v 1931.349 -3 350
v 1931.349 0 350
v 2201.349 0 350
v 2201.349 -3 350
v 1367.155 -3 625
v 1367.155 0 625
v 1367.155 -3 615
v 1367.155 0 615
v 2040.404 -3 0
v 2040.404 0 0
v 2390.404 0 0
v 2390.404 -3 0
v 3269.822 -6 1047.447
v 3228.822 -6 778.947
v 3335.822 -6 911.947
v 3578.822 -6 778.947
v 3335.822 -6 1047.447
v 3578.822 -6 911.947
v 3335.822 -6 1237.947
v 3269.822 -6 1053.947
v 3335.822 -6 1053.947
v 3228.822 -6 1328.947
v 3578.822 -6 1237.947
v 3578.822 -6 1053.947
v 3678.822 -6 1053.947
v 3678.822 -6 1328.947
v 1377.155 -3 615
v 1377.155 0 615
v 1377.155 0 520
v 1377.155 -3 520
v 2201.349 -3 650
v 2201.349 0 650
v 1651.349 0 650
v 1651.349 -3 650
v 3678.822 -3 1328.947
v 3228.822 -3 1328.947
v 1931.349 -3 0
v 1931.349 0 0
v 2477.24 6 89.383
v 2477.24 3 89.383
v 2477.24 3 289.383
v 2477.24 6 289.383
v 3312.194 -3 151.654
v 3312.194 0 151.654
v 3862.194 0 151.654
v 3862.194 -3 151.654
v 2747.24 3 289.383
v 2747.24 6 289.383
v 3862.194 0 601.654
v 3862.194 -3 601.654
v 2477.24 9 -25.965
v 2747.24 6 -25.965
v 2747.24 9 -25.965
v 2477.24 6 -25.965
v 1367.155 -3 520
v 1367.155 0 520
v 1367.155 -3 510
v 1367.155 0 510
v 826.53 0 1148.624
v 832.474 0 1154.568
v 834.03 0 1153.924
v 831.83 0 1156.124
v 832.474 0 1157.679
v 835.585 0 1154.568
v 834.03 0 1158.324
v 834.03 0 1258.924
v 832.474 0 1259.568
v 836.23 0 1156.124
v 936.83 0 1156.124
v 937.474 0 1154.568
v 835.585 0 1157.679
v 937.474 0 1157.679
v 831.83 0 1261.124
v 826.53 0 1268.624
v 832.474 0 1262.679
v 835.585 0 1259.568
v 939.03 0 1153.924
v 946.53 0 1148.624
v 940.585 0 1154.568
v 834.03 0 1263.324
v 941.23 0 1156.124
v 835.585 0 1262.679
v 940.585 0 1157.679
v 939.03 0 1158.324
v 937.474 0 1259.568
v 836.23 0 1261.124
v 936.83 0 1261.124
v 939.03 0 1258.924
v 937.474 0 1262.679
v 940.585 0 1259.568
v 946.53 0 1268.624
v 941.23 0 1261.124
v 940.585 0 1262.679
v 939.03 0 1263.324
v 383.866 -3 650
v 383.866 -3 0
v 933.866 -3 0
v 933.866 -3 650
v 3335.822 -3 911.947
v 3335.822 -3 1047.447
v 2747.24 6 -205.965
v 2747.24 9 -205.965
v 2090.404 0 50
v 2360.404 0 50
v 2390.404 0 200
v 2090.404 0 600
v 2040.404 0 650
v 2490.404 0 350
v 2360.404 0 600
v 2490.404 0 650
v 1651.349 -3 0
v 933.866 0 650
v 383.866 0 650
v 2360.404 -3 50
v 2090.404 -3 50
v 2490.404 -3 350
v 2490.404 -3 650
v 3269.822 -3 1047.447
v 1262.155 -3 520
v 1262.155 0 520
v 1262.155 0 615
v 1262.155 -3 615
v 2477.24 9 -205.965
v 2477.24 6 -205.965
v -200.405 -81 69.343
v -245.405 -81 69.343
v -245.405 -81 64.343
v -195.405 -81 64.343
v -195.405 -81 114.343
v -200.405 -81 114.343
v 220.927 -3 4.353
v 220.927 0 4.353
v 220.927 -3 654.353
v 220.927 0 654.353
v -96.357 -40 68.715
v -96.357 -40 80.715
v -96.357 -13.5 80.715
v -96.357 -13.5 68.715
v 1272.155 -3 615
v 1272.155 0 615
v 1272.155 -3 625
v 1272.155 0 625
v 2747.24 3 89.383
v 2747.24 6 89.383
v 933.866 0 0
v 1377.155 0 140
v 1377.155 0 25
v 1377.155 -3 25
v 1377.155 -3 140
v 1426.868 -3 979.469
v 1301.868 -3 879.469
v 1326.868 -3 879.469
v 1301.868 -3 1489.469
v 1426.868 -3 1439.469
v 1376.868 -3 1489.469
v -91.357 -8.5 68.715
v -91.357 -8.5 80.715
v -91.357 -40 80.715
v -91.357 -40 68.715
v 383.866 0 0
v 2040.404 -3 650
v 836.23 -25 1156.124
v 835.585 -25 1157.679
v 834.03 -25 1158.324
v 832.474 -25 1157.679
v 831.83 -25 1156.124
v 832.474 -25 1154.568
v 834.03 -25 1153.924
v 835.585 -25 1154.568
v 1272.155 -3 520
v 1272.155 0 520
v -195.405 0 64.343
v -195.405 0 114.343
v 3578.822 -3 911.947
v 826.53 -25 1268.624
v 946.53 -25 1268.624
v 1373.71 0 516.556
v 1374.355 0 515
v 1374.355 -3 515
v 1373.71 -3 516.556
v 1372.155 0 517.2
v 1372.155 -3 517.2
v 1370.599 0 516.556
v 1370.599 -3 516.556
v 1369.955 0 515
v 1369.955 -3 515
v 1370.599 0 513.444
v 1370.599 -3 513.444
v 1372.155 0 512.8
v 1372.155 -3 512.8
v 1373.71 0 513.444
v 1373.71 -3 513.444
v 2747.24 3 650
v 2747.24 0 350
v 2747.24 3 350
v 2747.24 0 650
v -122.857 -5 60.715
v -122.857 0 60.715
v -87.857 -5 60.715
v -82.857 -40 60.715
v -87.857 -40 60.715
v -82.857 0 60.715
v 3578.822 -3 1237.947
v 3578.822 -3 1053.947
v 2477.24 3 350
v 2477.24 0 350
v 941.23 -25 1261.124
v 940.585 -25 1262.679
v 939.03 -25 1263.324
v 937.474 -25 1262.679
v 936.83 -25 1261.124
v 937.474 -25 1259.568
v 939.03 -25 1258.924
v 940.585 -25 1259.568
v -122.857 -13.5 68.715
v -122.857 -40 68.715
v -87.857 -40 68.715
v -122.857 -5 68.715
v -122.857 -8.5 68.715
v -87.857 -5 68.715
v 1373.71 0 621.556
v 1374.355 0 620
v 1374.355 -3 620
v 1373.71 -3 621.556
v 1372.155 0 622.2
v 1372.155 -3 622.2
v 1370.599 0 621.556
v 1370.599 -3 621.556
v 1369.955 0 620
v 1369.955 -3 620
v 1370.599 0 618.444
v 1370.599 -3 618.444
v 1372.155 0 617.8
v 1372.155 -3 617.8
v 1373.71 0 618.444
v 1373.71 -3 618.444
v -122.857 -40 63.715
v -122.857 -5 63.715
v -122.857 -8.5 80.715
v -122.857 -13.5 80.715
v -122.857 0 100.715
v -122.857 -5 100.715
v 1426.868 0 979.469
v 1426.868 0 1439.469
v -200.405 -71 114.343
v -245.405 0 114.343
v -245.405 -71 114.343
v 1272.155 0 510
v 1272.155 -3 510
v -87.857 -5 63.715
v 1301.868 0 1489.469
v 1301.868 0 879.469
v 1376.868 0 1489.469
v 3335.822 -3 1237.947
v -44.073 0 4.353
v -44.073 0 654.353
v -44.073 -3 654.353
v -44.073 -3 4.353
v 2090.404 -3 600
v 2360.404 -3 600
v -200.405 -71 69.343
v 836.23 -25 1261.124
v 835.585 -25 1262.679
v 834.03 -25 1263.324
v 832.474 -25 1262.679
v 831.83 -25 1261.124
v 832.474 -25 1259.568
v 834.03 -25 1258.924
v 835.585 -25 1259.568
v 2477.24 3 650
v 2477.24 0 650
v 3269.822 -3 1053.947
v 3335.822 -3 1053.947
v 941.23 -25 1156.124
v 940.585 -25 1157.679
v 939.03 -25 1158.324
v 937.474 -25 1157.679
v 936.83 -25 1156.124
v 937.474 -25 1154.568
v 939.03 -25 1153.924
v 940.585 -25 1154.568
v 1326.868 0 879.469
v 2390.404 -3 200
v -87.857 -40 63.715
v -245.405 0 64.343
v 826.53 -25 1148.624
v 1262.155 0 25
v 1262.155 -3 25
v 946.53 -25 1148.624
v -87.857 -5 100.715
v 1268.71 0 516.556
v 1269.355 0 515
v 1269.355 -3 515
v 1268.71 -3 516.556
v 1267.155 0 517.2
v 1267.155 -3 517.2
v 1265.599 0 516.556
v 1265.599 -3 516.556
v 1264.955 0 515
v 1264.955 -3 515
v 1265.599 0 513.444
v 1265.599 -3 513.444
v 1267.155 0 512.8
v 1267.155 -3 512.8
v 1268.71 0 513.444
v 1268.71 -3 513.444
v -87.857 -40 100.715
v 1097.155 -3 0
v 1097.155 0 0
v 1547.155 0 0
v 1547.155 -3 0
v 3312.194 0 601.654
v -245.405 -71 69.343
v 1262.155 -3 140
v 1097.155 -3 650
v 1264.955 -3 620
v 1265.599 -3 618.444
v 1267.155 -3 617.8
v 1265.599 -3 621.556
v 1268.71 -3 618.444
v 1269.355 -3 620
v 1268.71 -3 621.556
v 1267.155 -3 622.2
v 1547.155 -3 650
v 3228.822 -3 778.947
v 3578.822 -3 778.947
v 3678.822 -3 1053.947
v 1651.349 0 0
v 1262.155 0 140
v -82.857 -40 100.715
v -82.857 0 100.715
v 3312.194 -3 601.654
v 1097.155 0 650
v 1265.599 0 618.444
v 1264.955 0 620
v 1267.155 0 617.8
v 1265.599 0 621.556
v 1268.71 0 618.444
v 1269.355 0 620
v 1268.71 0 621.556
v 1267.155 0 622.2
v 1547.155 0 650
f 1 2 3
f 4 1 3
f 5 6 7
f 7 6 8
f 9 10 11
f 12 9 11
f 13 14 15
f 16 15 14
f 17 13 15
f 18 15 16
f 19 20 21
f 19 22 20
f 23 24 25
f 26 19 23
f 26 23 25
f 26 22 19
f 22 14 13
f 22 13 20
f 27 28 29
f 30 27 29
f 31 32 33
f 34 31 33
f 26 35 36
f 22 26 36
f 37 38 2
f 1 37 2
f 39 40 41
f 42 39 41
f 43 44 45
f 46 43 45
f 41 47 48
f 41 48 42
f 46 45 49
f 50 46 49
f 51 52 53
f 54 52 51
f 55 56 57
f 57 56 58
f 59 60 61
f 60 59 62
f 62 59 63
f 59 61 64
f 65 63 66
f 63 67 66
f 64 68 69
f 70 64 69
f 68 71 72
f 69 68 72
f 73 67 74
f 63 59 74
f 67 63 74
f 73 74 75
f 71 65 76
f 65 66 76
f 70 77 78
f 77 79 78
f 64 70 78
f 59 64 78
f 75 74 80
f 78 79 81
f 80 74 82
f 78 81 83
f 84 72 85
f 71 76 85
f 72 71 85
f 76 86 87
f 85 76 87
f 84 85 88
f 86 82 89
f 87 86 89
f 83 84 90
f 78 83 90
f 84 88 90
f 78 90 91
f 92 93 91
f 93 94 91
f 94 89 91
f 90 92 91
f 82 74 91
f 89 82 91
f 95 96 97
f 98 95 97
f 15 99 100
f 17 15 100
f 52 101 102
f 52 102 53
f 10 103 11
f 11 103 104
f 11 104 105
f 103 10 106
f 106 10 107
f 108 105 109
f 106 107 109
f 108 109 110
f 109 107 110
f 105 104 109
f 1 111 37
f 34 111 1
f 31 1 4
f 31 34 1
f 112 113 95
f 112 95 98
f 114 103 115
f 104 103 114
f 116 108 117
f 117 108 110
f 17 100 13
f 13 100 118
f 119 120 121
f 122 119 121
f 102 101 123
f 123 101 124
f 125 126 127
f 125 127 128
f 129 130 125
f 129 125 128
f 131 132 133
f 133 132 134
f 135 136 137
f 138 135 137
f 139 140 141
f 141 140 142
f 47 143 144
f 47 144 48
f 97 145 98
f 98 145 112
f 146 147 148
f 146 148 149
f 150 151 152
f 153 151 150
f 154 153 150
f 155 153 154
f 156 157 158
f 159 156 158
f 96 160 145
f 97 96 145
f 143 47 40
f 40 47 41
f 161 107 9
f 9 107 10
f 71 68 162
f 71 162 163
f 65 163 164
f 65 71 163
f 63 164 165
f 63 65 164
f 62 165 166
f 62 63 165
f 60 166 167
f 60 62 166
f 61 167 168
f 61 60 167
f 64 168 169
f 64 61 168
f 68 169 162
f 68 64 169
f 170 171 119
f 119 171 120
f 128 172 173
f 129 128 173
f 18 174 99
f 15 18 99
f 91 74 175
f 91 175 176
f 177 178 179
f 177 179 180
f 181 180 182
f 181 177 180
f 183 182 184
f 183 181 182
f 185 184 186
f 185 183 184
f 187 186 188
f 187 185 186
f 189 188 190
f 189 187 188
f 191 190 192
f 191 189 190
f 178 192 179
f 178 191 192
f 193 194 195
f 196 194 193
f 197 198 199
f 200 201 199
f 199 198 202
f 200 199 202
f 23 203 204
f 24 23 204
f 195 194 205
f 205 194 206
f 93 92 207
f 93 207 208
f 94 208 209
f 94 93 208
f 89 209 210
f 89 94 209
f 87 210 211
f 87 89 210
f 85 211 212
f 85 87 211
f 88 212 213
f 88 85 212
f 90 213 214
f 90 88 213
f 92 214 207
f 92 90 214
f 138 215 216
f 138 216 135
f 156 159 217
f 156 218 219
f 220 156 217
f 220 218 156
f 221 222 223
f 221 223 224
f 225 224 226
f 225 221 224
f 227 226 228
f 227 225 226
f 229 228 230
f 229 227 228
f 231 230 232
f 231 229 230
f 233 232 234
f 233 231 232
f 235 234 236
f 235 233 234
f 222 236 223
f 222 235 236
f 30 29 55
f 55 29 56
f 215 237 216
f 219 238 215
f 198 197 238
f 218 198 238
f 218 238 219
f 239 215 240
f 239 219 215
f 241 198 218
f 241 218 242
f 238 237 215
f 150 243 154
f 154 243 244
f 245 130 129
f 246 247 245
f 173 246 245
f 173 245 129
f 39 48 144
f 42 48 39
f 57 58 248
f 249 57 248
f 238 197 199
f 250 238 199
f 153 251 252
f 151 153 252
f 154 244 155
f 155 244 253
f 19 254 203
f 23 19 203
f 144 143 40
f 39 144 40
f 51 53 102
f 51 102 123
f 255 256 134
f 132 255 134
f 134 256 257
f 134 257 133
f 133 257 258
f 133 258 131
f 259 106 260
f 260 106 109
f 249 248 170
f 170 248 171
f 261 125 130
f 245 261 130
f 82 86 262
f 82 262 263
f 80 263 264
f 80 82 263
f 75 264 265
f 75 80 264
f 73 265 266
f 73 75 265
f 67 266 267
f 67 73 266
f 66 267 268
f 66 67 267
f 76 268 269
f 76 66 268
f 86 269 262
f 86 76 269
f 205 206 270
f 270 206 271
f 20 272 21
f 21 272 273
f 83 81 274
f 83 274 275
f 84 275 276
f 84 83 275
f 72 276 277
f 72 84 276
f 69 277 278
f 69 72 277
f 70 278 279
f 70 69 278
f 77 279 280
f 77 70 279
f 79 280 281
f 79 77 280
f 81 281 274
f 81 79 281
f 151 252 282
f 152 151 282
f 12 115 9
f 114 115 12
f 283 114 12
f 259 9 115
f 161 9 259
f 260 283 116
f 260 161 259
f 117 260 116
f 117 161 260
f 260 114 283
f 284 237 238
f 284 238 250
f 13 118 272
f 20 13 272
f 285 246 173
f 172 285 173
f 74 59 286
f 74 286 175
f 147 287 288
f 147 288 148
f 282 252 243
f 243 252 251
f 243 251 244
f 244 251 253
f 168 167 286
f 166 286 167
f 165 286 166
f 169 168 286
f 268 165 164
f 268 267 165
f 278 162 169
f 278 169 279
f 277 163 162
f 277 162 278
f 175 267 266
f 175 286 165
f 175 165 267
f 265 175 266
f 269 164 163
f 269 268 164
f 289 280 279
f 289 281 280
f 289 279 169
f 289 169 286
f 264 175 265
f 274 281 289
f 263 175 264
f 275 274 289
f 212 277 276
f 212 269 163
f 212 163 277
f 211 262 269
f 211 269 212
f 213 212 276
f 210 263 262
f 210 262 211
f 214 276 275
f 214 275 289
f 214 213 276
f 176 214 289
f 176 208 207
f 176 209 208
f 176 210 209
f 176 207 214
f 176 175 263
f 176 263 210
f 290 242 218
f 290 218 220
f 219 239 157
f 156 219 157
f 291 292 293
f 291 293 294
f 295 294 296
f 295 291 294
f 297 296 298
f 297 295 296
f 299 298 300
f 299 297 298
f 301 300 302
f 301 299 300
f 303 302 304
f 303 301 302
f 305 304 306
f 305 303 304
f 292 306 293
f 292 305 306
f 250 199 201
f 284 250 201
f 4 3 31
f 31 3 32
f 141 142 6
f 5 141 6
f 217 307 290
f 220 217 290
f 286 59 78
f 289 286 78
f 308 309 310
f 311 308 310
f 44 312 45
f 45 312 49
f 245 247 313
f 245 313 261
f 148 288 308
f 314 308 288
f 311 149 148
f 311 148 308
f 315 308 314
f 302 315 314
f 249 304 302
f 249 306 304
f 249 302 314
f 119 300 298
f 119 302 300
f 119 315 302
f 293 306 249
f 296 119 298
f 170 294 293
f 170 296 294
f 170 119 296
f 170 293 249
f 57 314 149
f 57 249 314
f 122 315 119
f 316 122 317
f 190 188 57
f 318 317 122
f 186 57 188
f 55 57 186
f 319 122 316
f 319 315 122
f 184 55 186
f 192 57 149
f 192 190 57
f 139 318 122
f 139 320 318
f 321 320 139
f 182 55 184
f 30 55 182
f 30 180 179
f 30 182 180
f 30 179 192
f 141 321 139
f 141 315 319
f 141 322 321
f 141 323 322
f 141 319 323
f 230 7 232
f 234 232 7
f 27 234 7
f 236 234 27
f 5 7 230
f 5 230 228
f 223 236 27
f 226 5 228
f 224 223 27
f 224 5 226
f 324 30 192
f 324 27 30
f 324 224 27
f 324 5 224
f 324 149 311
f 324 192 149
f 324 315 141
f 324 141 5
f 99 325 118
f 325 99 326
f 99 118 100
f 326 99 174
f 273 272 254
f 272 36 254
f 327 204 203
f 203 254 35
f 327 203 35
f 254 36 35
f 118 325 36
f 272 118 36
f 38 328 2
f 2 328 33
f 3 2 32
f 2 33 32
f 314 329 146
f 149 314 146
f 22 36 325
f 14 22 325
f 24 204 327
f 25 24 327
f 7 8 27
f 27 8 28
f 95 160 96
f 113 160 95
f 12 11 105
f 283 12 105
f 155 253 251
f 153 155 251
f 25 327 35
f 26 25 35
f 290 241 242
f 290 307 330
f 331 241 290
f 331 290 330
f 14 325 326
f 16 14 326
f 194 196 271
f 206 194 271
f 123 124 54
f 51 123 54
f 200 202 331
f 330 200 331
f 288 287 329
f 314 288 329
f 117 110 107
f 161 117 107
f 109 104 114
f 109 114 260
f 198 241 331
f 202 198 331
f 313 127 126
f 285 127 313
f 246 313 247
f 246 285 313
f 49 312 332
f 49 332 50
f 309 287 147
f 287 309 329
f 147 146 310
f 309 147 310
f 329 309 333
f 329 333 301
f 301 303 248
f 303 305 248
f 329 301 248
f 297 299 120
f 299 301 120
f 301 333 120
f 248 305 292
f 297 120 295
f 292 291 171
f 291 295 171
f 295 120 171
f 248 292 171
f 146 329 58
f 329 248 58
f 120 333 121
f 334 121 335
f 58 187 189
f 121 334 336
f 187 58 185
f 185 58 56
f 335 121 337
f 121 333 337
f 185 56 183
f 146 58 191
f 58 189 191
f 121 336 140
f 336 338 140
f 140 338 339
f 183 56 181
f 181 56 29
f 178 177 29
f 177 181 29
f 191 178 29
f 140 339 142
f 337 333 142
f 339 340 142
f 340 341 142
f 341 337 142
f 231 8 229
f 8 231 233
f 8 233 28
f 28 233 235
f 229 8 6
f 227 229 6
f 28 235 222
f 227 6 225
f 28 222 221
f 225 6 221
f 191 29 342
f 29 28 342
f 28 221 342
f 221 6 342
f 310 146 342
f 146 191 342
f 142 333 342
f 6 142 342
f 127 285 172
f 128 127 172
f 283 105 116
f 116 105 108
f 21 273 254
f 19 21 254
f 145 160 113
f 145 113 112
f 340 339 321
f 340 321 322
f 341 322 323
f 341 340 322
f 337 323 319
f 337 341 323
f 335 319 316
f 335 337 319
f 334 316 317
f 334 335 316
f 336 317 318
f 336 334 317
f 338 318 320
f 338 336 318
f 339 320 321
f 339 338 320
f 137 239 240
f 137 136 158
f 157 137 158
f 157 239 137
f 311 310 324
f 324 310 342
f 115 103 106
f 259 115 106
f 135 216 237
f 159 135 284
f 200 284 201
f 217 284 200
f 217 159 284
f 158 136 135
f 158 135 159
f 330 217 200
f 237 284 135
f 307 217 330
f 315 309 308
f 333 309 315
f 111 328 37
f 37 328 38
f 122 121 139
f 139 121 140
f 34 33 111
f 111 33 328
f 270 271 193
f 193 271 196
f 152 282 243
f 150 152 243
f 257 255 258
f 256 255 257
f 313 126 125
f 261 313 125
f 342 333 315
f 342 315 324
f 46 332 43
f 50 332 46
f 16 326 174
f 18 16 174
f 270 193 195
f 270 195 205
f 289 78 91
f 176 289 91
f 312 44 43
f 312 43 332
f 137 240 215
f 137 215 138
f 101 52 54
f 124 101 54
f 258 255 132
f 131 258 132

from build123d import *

# Parameters (mm, degrees)
F0_W      = 40
F0_H      = 40
F1_DEPTH  = 40
F2_W      = 35
F2_H      = 35
F3_DEPTH  = 20
F4_W      = 35
F4_H      = 35
F5_DEPTH  = 3
F6_W      = 26.5
F6_H      = 26.5
F7_DEPTH  = 12
F8_W      = 265
F8_H      = 650
F9_DEPTH  = 3
F10_W     = 550
F10_H     = 650
F11_DEPTH = 3
F12_W     = 450
F12_H     = 650
F12_W_2   = 115
F12_H_2   = 115
F12_R     = 2.2
F13_DEPTH = 3
F15_DEPTH = 3
F16_W     = 270
F16_H     = 550
F17_DEPTH = 3
F18_W     = 13.1645835346
F18_H     = 300
F18_W_2   = 256.8354164654
F19_DEPTH = 3
F20_W     = 270
F20_H     = 200
F21_DEPTH = 3
F22_W     = 270
F22_H     = 180
F23_DEPTH = 3
F24_W     = 550
F24_H     = 450
F25_DEPTH = 3
F27_DEPTH = 3
F28_W     = 50
F28_H     = 50
F29_DEPTH = 81
F30_W     = 45
F30_H     = 45
F31_DEPTH = 10
F32_W     = 120
F32_H     = 120
F32_R     = 2.2
F33_DEPTH = 25
F35_DEPTH = 3


with BuildPart() as f1:
    # F0 (on Front) → F1 (new body)
    with BuildSketch(Plane.XZ):
        with Locations((-102.8566464484, 80.7153475598)):
            Rectangle(F0_W, F0_H)
    extrude(amount=F1_DEPTH)

    # F2 (on face) → F3 (cut)
    with BuildSketch(Plane.XY.offset(100.7153475598)):
        with Locations((-105.3566464484, -22.5)):
            Rectangle(F2_W, F2_H)
    extrude(amount=-F3_DEPTH, mode=Mode.SUBTRACT)

    # F4 (on face) → F5 (cut)
    with BuildSketch(Plane(origin=(0, 0, 60.7153475598), x_dir=(1, 0, 0), z_dir=(0, 0, -1))):
        with Locations((-105.3566464484, 22.5)):
            Rectangle(F4_W, F4_H)
    extrude(amount=-F5_DEPTH, mode=Mode.SUBTRACT)

    # F6 (on face) → F7 (cut)
    with BuildSketch(Plane.XY.offset(80.7153475598)):
        with Locations((-109.6066464484, -26.75)):
            Rectangle(F6_W, F6_H)
        Polygon((-91.3566464484, -8.5), (-91.3566464484, -40), (-87.8566464484, -40), (-87.8566464484, -5), (-91.3566464484, -5), (-91.9287055731, -5), (-122.8566464484, -5), (-122.8566464484, -8.5), align=None)
    extrude(amount=-F7_DEPTH, mode=Mode.SUBTRACT)


with BuildPart() as f9:
    # F8 (on Front) → F9 (new body)
    with BuildSketch(Plane.XZ):
        with Locations((88.4266790748, 329.3526981026)):
            Rectangle(F8_W, F8_H)
    extrude(amount=F9_DEPTH)


with BuildPart() as f11:
    # F10 (on Front) → F11 (new body)
    with BuildSketch(Plane.XZ):
        with Locations((658.8658335028, 325)):
            Rectangle(F10_W, F10_H)
    extrude(amount=F11_DEPTH)


with BuildPart() as f13:
    # F12 (on Front) → F13 (new body)
    with BuildSketch(Plane.XZ):
        with Locations((1322.1548128128, 325)):
            Rectangle(F12_W, F12_H)
        with Locations((1319.6548128128, 82.5)):
            Rectangle(F12_W_2, F12_H_2, mode=Mode.SUBTRACT)
        with Locations((1267.1548128128, 515)):
            Circle(F12_R, mode=Mode.SUBTRACT)
        Polygon((1262.1548128128, 520), (1262.1548128128, 615), (1272.1548128128, 615), (1272.1548128128, 625), (1367.1548128128, 625), (1367.1548128128, 615), (1377.1548128128, 615), (1377.1548128128, 520), (1367.1548128128, 520), (1367.1548128128, 510), (1272.1548128128, 510), (1272.1548128128, 520), align=None, mode=Mode.SUBTRACT)
        with Locations((1267.1548128128, 620)):
            Circle(F12_R, mode=Mode.SUBTRACT)
        with Locations((1372.1548128128, 515)):
            Circle(F12_R, mode=Mode.SUBTRACT)
        with Locations((1372.1548128128, 620)):
            Circle(F12_R, mode=Mode.SUBTRACT)
    extrude(amount=F13_DEPTH)


with BuildPart() as f15:
    # F14 (on Front) → F15 (new body)
    with BuildSketch(Plane.XZ):
        Polygon((1651.3492820922, 650), (1651.3492820922, 0), (1931.3492820922, 0), (1931.3492820922, 350), (2201.3492820922, 350), (2201.3492820922, 650), align=None)
    extrude(amount=F15_DEPTH)


with BuildPart() as f17:
    # F16 (on Front) → F17 (new body)
    with BuildSketch(Plane.XZ):
        Polygon((2040.4041732257, 650), (2040.4041732257, 0), (2390.4041732257, 0), (2390.4041732257, 200), (2490.4041732257, 350), (2490.4041732257, 650), (2390.4041732257, 650), align=None)
        with Locations((2225.4041732257, 325)):
            Rectangle(F16_W, F16_H, mode=Mode.SUBTRACT)
    extrude(amount=F17_DEPTH)


with BuildPart() as f19:
    # F18 (on face) → F19 (new body)
    with BuildSketch(Plane(origin=(0, 0, 0), x_dir=(-1, 0, 0), z_dir=(0, 1, 0))):
        with Locations((-2483.8218814584, 500)):
            Rectangle(F18_W, F18_H)
        with Locations((-2618.8218814584, 500)):
            Rectangle(F18_W_2, F18_H)
    extrude(amount=F19_DEPTH)


with BuildPart() as f21:
    # F20 (on face) → F21 (new body)
    with BuildSketch(Plane(origin=(0, 3, 0), x_dir=(-1, 0, 0), z_dir=(0, 1, 0))):
        with Locations((-2612.2395896912, 189.3829244978)):
            Rectangle(F20_W, F20_H)
    extrude(amount=F21_DEPTH)


with BuildPart() as f23:
    # F22 (on face) → F23 (new body)
    with BuildSketch(Plane(origin=(0, 6, 0), x_dir=(-1, 0, 0), z_dir=(0, 1, 0))):
        with Locations((-2612.2395896912, -115.965121549)):
            Rectangle(F22_W, F22_H)
    extrude(amount=F23_DEPTH)


with BuildPart() as f25:
    # F24 (on Front) → F25 (new body)
    with BuildSketch(Plane.XZ):
        with Locations((3587.194108963, 376.6544529481)):
            Rectangle(F24_W, F24_H)
    extrude(amount=F25_DEPTH)


with BuildPart() as f27:
    # F26 (on face) → F27 (new body)
    with BuildSketch(Plane.XZ.offset(3)):
        Polygon((3678.8215652645, 1328.9465069771), (3228.8215652645, 1328.9465069771), (3228.8215652645, 778.9465069771), (3578.8215652645, 778.9465069771), (3578.8215652645, 911.9465069771), (3335.8215652645, 911.9465069771), (3335.8215652645, 1047.4465069771), (3269.8215652645, 1047.4465069771), (3269.8215652645, 1053.9465069771), (3335.8215652645, 1053.9465069771), (3335.8215652645, 1237.9465069771), (3578.8215652645, 1237.9465069771), (3578.8215652645, 1053.9465069771), (3678.8215652645, 1053.9465069771), align=None)
    extrude(amount=F27_DEPTH)


with BuildPart() as f29:
    # F28 (on Front) → F29 (new body)
    with BuildSketch(Plane.XZ):
        with Locations((-220.404677093, 89.3433275744)):
            Rectangle(F28_W, F28_H)
    extrude(amount=F29_DEPTH)

    # F30 (on face) → F31 (cut)
    with BuildSketch(Plane.XZ.offset(81)):
        with Locations((-222.904677093, 91.8433275744)):
            Rectangle(F30_W, F30_H)
    extrude(amount=-F31_DEPTH, mode=Mode.SUBTRACT)


with BuildPart() as f33:
    # F32 (on Front) → F33 (new body)
    with BuildSketch(Plane.XZ):
        with Locations((886.5295350552, 1208.6237928141)):
            Rectangle(F32_W, F32_H)
        with Locations((834.0295350552, 1156.1237928141)):
            Circle(F32_R, mode=Mode.SUBTRACT)
        with Locations((939.0295350552, 1156.1237928141)):
            Circle(F32_R, mode=Mode.SUBTRACT)
        with Locations((834.0295350552, 1261.1237928141)):
            Circle(F32_R, mode=Mode.SUBTRACT)
        with Locations((939.0295350552, 1261.1237928141)):
            Circle(F32_R, mode=Mode.SUBTRACT)
    extrude(amount=F33_DEPTH)


with BuildPart() as f35:
    # F34 (on Front) → F35 (new body)
    with BuildSketch(Plane.XZ):
        Polygon((1301.8677513387, 1489.4693756618), (1301.8677513387, 879.4693756618), (1326.8677513387, 879.4693756618), (1426.8677513387, 979.4693756618), (1426.8677513387, 1439.4693756618), (1376.8677513387, 1489.4693756618), align=None)
    extrude(amount=F35_DEPTH)


solid = Compound([f1.part, f9.part, f11.part, f13.part, f15.part, f17.part, f19.part, f21.part, f23.part, f25.part, f27.part, f29.part, f33.part, f35.part])
